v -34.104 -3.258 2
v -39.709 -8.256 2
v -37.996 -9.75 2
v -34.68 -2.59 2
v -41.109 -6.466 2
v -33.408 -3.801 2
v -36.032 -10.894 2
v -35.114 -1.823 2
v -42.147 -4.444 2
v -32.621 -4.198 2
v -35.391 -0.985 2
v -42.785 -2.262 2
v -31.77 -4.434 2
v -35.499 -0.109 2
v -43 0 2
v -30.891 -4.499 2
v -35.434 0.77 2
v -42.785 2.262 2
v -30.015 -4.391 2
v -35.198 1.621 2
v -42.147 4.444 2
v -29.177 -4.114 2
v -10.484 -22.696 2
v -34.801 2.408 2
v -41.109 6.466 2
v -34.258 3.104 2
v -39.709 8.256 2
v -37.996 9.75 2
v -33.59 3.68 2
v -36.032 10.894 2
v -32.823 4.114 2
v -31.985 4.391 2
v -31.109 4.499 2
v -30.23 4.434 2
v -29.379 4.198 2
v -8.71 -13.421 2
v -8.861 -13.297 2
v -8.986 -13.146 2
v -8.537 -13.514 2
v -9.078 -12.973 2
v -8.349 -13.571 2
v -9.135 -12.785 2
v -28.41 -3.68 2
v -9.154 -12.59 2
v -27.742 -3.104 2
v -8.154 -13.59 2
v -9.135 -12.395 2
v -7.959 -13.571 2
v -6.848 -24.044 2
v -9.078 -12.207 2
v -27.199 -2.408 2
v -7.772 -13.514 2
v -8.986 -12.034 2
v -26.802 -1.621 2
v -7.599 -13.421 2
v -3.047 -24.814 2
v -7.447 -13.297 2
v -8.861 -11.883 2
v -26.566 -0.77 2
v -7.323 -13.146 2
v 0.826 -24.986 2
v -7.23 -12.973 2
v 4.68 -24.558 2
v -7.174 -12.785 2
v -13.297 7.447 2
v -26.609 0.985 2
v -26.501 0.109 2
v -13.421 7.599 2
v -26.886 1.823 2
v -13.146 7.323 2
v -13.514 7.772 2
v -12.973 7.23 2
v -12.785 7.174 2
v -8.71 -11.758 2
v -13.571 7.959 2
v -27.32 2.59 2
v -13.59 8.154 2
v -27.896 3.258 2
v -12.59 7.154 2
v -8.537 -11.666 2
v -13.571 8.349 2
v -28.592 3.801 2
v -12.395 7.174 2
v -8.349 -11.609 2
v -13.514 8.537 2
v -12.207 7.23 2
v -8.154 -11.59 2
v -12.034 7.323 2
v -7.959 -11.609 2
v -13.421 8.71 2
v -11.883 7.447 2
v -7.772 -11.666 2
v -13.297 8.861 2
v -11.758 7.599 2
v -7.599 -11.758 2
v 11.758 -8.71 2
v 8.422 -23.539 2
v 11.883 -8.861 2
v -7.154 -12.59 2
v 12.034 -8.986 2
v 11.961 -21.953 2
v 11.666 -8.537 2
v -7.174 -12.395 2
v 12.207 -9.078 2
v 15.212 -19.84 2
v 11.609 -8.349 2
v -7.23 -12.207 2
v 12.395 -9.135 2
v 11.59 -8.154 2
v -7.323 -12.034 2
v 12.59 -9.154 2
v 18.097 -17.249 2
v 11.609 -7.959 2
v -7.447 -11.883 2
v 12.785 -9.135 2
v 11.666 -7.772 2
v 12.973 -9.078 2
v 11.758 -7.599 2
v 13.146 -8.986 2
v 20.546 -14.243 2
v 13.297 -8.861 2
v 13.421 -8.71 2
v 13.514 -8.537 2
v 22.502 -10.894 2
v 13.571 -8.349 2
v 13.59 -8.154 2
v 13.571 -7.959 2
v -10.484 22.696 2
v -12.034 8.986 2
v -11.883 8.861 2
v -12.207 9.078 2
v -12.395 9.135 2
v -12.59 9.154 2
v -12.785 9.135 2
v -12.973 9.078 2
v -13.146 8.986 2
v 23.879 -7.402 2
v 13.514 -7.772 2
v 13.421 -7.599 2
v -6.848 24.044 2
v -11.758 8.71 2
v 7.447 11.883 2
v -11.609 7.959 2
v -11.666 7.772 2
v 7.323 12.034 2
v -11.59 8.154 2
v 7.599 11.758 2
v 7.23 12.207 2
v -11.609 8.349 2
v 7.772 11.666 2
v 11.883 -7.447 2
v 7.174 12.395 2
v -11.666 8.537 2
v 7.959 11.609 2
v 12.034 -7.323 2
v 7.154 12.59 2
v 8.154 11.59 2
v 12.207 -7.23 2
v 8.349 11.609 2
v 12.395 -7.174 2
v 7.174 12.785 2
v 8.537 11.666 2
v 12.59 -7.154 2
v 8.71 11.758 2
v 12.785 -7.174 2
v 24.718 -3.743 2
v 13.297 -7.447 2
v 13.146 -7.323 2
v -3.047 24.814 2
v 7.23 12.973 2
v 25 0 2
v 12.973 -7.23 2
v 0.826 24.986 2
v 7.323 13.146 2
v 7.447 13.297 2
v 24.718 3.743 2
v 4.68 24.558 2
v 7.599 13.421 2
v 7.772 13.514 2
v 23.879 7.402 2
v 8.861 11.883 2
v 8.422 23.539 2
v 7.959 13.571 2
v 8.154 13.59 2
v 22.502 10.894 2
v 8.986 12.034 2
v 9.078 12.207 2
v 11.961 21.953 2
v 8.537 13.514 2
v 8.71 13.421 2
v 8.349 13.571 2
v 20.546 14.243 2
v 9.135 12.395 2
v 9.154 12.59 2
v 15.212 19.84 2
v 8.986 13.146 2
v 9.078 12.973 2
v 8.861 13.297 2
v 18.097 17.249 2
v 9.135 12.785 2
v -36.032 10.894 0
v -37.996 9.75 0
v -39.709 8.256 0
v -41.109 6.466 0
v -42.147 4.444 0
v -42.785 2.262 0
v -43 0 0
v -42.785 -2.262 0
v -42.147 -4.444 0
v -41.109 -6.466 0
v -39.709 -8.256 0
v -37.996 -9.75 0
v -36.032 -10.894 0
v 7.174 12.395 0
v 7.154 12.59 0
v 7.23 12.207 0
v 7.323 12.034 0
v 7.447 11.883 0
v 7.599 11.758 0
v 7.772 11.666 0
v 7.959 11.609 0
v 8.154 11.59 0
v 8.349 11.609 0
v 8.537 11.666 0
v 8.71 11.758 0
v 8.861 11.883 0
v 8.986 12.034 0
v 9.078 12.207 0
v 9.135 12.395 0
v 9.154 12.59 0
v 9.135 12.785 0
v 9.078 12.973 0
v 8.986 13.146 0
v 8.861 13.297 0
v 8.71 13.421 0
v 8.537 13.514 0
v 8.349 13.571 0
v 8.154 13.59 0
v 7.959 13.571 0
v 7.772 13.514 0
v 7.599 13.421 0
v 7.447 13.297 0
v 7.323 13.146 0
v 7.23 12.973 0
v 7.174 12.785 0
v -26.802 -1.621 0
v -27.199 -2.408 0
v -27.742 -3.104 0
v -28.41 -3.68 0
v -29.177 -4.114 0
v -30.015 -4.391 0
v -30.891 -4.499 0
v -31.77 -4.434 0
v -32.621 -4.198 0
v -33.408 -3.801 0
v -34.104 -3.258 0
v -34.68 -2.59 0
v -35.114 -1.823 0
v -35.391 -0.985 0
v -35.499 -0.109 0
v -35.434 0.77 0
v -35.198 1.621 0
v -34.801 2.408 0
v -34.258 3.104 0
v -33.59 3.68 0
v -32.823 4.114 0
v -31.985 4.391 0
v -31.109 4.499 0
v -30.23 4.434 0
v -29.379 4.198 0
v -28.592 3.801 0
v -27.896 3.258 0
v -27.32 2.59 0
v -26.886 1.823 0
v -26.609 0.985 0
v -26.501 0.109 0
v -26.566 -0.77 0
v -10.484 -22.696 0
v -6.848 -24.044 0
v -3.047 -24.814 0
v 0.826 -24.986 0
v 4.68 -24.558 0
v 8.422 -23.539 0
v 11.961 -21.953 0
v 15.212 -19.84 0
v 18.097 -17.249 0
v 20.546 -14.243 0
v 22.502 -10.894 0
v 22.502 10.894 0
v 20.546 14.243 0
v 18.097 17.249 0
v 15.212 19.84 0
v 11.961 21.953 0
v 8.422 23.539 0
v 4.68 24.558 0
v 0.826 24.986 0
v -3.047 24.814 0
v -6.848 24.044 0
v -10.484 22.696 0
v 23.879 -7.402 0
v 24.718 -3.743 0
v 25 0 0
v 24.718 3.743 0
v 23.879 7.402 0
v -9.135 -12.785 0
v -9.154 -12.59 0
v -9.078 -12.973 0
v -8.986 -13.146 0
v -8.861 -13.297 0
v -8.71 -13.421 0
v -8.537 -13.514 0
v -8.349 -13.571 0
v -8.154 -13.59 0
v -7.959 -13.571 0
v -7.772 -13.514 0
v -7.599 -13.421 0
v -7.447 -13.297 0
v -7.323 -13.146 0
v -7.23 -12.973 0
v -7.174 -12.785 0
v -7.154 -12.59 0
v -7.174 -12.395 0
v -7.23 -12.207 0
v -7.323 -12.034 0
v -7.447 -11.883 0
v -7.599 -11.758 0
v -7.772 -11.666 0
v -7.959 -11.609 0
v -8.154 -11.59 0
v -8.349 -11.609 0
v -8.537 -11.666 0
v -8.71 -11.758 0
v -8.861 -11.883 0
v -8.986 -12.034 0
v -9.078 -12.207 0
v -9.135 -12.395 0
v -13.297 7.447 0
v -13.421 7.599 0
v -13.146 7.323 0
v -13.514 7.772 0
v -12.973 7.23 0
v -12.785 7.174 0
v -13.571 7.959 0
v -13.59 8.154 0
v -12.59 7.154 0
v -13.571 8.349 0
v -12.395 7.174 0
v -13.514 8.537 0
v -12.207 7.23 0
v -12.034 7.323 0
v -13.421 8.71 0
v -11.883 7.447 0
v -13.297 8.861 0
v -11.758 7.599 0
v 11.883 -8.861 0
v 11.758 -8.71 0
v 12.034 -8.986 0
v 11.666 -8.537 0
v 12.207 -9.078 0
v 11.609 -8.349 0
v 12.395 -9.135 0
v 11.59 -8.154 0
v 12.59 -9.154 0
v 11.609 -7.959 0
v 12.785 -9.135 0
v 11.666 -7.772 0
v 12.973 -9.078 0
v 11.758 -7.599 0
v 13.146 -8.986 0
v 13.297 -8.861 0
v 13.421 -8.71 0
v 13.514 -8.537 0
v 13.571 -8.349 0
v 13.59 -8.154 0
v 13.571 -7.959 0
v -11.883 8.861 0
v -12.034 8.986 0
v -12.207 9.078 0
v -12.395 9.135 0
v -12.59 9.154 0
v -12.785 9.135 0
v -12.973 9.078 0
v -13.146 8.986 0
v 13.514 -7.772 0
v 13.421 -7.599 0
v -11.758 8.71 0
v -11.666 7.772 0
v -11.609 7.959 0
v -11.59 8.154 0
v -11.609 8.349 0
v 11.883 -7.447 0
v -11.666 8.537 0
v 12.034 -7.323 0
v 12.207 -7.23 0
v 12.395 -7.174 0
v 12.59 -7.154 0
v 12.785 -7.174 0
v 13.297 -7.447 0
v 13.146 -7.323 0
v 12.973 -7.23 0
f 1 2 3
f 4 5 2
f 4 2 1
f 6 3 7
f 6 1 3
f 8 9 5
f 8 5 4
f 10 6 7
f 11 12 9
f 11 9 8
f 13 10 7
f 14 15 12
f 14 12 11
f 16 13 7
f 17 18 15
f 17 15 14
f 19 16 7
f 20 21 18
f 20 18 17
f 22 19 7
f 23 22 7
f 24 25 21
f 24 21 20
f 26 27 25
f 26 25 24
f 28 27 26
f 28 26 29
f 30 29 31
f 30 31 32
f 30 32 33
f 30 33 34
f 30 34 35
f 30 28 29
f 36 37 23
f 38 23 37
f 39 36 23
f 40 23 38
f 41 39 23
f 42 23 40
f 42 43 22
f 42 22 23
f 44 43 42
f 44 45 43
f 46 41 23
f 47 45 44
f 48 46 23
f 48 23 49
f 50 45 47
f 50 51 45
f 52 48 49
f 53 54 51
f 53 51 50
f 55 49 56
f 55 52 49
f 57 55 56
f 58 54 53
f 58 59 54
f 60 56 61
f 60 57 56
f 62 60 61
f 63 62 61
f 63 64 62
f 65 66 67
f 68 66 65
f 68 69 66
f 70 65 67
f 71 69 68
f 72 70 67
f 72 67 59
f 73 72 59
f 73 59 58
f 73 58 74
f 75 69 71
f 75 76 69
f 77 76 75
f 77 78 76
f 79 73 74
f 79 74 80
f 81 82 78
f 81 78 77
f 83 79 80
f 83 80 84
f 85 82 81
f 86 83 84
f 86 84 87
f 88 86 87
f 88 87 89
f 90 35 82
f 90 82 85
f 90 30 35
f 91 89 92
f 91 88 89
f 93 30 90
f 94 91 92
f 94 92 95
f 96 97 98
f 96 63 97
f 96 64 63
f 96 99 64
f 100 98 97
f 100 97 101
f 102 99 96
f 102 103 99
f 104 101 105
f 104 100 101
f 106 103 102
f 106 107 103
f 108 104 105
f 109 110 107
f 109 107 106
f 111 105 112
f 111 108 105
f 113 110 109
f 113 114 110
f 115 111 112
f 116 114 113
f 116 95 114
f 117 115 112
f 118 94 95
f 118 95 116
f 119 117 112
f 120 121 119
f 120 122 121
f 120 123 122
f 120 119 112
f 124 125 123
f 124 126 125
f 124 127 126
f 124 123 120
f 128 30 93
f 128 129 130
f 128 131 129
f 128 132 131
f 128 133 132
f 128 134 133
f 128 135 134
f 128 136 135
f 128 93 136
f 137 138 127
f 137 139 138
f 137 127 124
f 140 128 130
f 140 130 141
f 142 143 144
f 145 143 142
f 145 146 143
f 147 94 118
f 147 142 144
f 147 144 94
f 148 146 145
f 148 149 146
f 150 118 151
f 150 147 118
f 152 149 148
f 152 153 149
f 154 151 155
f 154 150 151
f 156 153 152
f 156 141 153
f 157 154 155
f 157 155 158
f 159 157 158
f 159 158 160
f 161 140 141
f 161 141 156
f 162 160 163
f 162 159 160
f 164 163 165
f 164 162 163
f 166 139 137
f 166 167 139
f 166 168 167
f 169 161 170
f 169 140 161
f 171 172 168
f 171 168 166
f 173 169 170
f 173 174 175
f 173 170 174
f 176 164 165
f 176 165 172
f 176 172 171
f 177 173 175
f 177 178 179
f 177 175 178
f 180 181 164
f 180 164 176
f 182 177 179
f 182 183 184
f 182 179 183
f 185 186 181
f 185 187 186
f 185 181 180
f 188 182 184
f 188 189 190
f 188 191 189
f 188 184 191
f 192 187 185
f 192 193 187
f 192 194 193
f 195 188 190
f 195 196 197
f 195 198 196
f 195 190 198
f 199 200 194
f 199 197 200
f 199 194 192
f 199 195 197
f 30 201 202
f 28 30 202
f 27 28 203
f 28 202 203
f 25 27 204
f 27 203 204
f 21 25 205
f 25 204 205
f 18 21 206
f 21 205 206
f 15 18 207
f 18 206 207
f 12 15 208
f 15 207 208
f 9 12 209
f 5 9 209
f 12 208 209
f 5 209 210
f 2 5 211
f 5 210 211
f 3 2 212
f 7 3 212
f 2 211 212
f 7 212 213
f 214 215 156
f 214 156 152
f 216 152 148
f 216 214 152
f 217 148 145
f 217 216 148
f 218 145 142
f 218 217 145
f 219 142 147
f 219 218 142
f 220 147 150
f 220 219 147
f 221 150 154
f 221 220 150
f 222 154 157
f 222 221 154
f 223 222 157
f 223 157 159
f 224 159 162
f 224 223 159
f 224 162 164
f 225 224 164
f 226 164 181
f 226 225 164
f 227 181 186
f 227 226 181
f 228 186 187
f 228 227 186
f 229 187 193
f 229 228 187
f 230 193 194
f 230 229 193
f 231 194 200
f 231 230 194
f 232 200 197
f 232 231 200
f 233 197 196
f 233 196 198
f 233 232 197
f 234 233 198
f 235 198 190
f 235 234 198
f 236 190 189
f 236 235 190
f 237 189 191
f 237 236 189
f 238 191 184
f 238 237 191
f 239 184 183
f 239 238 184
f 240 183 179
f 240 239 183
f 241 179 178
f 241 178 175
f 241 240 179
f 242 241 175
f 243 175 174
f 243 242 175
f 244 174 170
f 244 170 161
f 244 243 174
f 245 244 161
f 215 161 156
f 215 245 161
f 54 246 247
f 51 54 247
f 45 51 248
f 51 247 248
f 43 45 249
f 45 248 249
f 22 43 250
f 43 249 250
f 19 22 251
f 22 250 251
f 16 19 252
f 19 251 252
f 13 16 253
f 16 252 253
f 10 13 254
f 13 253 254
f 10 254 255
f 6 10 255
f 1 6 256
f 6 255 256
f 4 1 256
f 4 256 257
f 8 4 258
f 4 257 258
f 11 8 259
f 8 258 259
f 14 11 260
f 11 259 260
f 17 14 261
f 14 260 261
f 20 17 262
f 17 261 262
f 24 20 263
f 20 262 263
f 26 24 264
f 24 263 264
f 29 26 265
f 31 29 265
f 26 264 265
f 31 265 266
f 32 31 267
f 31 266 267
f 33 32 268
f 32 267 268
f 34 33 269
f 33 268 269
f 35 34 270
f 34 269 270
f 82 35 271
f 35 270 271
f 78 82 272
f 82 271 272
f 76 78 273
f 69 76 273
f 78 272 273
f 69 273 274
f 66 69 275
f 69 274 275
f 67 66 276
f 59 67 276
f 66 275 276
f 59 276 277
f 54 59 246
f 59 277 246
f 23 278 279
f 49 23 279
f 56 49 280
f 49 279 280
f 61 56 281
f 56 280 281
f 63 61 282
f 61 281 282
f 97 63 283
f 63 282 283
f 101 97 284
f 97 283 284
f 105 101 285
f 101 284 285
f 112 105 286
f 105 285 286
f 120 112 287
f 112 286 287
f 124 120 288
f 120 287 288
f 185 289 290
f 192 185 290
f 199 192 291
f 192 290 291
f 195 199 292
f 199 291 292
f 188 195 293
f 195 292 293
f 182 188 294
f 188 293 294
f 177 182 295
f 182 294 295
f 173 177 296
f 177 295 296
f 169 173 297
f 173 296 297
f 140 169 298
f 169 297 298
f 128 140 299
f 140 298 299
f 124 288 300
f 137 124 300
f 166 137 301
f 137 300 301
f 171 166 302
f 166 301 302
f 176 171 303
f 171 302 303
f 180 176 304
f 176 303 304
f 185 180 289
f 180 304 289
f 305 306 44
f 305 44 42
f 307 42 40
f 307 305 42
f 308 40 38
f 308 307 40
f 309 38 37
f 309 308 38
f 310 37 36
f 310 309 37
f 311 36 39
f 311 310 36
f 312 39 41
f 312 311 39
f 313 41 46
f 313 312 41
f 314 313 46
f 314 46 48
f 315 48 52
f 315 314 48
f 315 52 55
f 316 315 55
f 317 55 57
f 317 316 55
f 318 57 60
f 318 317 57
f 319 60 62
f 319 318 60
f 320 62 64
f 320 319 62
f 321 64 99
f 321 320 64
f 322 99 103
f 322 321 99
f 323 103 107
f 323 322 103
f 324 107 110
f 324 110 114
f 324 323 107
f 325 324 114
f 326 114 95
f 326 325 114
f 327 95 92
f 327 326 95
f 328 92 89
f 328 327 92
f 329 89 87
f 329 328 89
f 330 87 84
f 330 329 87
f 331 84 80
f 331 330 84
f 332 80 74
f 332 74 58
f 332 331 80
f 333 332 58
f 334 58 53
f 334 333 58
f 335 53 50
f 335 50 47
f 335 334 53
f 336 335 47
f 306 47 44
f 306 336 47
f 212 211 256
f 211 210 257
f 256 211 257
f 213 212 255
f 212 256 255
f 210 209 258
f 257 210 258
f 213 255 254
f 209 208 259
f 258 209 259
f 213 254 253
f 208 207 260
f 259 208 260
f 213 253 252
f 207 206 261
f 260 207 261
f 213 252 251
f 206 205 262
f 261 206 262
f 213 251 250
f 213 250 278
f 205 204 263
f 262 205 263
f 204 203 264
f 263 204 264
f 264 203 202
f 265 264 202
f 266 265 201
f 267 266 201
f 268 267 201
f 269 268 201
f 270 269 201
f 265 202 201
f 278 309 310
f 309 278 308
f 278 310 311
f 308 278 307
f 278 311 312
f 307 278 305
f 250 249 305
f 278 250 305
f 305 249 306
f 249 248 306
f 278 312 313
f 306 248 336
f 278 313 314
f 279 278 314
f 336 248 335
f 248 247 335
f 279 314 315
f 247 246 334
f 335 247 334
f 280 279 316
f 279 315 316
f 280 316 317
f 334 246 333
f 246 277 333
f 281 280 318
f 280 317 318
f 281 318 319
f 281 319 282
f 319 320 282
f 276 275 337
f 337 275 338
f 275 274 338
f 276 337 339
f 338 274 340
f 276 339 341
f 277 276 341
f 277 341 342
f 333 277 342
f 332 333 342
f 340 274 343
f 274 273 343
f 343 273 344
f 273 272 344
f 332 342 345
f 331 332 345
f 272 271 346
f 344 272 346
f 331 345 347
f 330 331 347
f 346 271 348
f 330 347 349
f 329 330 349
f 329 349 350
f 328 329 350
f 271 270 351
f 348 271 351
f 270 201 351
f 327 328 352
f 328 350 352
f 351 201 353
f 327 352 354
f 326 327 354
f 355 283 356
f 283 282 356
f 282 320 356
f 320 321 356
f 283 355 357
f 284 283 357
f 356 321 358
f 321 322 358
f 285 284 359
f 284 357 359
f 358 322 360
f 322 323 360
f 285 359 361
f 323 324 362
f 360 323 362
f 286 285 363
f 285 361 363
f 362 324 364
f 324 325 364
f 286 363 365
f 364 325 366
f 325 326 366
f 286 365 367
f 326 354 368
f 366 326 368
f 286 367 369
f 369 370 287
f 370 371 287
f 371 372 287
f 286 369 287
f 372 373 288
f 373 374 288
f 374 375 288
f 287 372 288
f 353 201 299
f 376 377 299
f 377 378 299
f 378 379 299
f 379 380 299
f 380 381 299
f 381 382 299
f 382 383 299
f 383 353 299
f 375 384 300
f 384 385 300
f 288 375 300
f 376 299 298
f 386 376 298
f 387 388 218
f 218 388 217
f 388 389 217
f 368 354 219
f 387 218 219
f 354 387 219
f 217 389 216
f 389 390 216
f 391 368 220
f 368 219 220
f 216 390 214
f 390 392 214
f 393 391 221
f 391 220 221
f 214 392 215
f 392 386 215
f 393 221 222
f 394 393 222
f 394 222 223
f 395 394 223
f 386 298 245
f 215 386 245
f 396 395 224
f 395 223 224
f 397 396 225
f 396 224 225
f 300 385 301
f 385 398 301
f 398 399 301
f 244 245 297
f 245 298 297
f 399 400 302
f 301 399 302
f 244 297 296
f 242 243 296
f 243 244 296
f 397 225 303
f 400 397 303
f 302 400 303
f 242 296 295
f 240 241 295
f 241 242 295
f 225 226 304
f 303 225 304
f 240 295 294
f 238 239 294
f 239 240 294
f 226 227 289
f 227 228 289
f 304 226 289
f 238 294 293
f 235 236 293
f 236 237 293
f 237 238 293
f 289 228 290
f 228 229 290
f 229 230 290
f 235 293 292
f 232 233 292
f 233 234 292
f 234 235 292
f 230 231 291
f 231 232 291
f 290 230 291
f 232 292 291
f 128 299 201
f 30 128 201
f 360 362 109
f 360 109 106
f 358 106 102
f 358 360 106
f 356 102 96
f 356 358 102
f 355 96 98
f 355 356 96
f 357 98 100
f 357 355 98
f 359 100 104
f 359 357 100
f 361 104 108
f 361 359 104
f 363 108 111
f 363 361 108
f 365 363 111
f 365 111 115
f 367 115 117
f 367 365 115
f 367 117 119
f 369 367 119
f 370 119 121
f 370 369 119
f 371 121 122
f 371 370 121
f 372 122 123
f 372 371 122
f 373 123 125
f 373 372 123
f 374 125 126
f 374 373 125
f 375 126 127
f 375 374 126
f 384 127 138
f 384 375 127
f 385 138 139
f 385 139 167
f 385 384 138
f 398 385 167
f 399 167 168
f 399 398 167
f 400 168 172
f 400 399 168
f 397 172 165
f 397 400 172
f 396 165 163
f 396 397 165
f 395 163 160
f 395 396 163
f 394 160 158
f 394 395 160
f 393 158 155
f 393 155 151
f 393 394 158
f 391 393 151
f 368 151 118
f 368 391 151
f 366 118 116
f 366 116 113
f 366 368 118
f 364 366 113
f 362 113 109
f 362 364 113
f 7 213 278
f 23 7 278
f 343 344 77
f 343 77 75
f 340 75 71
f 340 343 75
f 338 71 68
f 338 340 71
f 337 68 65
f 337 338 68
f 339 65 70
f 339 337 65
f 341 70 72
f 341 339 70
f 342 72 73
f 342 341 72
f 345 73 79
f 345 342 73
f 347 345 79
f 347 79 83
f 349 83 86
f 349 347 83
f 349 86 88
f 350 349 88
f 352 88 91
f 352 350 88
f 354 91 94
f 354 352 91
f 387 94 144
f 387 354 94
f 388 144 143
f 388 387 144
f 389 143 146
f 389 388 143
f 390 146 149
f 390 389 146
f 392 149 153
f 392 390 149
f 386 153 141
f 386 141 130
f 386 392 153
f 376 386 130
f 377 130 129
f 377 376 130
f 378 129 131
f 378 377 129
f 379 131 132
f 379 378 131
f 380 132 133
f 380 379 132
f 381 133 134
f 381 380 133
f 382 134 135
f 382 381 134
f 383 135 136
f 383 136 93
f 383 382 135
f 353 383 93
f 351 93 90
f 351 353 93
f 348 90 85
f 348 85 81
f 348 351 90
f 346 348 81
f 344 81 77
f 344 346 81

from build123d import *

# Parameters (mm, degrees)
SKETCH1_R           = 1
SKETCH1_R_2         = 7.5
BOSS_EXTRUDE1_DEPTH = 2


with BuildPart() as part:
    # Sketch1 → Boss-Extrude1 (new body)
    # profile 1 of 2: a face of its own
    with BuildSketch(Plane.XY):
        with BuildLine():
            ThreePointArc((-36.032258065, 10.893868862), (-43, 0), (-36.032258065, -10.893868862))
            Line((-36.032258065, -10.893868862), (-10.483870968, -22.695560128))
            ThreePointArc((-10.483870968, -22.695560128), (8.421796013, -23.538762752), (22.501635968, -10.893868862))
            ThreePointArc((22.501635968, -10.893868862), (25, 0), (22.501635968, 10.893868862))
            ThreePointArc((22.501635968, 10.893868862), (8.421796013, 23.538762752), (-10.483870968, 22.695560128))
            Line((-10.483870968, 22.695560128), (-36.032258065, 10.893868862))
        make_face()
        with Locations(Location((8.154330676, 12.589951995, 0), (0, 0, 180))):
            Circle(SKETCH1_R, mode=Mode.SUBTRACT)
        with Locations(Location((-8.154330676, -12.589951995, 0), (0, 0, 180))):
            Circle(SKETCH1_R, mode=Mode.SUBTRACT)
        with Locations((-31, 0)):
            Circle(SKETCH1_R_2, mode=Mode.SUBTRACT)
        with Locations(Location((12.589951995, -8.154330676, 0), (0, 0, 180))):
            Circle(SKETCH1_R, mode=Mode.SUBTRACT)
        with Locations(Location((-12.589951995, 8.154330676, 0), (0, 0, 180))):
            Circle(SKETCH1_R, mode=Mode.SUBTRACT)
    # profile 2 of 2: a face of its own
    with BuildSketch(Plane.XY):
        with Locations((-31, 0)):
            Circle(SKETCH1_R_2)
        with BuildLine():
            ThreePointArc((-35.198052011, 1.620604614), (-29.379395386, 4.198052011), (-26.801947989, -1.620604614))
            ThreePointArc((-26.801947989, -1.620604614), (-32.620604614, -4.198052011), (-35.198052011, 1.620604614))
        make_face(mode=Mode.SUBTRACT)
    extrude(amount=BOSS_EXTRUDE1_DEPTH)


solid = part.part
